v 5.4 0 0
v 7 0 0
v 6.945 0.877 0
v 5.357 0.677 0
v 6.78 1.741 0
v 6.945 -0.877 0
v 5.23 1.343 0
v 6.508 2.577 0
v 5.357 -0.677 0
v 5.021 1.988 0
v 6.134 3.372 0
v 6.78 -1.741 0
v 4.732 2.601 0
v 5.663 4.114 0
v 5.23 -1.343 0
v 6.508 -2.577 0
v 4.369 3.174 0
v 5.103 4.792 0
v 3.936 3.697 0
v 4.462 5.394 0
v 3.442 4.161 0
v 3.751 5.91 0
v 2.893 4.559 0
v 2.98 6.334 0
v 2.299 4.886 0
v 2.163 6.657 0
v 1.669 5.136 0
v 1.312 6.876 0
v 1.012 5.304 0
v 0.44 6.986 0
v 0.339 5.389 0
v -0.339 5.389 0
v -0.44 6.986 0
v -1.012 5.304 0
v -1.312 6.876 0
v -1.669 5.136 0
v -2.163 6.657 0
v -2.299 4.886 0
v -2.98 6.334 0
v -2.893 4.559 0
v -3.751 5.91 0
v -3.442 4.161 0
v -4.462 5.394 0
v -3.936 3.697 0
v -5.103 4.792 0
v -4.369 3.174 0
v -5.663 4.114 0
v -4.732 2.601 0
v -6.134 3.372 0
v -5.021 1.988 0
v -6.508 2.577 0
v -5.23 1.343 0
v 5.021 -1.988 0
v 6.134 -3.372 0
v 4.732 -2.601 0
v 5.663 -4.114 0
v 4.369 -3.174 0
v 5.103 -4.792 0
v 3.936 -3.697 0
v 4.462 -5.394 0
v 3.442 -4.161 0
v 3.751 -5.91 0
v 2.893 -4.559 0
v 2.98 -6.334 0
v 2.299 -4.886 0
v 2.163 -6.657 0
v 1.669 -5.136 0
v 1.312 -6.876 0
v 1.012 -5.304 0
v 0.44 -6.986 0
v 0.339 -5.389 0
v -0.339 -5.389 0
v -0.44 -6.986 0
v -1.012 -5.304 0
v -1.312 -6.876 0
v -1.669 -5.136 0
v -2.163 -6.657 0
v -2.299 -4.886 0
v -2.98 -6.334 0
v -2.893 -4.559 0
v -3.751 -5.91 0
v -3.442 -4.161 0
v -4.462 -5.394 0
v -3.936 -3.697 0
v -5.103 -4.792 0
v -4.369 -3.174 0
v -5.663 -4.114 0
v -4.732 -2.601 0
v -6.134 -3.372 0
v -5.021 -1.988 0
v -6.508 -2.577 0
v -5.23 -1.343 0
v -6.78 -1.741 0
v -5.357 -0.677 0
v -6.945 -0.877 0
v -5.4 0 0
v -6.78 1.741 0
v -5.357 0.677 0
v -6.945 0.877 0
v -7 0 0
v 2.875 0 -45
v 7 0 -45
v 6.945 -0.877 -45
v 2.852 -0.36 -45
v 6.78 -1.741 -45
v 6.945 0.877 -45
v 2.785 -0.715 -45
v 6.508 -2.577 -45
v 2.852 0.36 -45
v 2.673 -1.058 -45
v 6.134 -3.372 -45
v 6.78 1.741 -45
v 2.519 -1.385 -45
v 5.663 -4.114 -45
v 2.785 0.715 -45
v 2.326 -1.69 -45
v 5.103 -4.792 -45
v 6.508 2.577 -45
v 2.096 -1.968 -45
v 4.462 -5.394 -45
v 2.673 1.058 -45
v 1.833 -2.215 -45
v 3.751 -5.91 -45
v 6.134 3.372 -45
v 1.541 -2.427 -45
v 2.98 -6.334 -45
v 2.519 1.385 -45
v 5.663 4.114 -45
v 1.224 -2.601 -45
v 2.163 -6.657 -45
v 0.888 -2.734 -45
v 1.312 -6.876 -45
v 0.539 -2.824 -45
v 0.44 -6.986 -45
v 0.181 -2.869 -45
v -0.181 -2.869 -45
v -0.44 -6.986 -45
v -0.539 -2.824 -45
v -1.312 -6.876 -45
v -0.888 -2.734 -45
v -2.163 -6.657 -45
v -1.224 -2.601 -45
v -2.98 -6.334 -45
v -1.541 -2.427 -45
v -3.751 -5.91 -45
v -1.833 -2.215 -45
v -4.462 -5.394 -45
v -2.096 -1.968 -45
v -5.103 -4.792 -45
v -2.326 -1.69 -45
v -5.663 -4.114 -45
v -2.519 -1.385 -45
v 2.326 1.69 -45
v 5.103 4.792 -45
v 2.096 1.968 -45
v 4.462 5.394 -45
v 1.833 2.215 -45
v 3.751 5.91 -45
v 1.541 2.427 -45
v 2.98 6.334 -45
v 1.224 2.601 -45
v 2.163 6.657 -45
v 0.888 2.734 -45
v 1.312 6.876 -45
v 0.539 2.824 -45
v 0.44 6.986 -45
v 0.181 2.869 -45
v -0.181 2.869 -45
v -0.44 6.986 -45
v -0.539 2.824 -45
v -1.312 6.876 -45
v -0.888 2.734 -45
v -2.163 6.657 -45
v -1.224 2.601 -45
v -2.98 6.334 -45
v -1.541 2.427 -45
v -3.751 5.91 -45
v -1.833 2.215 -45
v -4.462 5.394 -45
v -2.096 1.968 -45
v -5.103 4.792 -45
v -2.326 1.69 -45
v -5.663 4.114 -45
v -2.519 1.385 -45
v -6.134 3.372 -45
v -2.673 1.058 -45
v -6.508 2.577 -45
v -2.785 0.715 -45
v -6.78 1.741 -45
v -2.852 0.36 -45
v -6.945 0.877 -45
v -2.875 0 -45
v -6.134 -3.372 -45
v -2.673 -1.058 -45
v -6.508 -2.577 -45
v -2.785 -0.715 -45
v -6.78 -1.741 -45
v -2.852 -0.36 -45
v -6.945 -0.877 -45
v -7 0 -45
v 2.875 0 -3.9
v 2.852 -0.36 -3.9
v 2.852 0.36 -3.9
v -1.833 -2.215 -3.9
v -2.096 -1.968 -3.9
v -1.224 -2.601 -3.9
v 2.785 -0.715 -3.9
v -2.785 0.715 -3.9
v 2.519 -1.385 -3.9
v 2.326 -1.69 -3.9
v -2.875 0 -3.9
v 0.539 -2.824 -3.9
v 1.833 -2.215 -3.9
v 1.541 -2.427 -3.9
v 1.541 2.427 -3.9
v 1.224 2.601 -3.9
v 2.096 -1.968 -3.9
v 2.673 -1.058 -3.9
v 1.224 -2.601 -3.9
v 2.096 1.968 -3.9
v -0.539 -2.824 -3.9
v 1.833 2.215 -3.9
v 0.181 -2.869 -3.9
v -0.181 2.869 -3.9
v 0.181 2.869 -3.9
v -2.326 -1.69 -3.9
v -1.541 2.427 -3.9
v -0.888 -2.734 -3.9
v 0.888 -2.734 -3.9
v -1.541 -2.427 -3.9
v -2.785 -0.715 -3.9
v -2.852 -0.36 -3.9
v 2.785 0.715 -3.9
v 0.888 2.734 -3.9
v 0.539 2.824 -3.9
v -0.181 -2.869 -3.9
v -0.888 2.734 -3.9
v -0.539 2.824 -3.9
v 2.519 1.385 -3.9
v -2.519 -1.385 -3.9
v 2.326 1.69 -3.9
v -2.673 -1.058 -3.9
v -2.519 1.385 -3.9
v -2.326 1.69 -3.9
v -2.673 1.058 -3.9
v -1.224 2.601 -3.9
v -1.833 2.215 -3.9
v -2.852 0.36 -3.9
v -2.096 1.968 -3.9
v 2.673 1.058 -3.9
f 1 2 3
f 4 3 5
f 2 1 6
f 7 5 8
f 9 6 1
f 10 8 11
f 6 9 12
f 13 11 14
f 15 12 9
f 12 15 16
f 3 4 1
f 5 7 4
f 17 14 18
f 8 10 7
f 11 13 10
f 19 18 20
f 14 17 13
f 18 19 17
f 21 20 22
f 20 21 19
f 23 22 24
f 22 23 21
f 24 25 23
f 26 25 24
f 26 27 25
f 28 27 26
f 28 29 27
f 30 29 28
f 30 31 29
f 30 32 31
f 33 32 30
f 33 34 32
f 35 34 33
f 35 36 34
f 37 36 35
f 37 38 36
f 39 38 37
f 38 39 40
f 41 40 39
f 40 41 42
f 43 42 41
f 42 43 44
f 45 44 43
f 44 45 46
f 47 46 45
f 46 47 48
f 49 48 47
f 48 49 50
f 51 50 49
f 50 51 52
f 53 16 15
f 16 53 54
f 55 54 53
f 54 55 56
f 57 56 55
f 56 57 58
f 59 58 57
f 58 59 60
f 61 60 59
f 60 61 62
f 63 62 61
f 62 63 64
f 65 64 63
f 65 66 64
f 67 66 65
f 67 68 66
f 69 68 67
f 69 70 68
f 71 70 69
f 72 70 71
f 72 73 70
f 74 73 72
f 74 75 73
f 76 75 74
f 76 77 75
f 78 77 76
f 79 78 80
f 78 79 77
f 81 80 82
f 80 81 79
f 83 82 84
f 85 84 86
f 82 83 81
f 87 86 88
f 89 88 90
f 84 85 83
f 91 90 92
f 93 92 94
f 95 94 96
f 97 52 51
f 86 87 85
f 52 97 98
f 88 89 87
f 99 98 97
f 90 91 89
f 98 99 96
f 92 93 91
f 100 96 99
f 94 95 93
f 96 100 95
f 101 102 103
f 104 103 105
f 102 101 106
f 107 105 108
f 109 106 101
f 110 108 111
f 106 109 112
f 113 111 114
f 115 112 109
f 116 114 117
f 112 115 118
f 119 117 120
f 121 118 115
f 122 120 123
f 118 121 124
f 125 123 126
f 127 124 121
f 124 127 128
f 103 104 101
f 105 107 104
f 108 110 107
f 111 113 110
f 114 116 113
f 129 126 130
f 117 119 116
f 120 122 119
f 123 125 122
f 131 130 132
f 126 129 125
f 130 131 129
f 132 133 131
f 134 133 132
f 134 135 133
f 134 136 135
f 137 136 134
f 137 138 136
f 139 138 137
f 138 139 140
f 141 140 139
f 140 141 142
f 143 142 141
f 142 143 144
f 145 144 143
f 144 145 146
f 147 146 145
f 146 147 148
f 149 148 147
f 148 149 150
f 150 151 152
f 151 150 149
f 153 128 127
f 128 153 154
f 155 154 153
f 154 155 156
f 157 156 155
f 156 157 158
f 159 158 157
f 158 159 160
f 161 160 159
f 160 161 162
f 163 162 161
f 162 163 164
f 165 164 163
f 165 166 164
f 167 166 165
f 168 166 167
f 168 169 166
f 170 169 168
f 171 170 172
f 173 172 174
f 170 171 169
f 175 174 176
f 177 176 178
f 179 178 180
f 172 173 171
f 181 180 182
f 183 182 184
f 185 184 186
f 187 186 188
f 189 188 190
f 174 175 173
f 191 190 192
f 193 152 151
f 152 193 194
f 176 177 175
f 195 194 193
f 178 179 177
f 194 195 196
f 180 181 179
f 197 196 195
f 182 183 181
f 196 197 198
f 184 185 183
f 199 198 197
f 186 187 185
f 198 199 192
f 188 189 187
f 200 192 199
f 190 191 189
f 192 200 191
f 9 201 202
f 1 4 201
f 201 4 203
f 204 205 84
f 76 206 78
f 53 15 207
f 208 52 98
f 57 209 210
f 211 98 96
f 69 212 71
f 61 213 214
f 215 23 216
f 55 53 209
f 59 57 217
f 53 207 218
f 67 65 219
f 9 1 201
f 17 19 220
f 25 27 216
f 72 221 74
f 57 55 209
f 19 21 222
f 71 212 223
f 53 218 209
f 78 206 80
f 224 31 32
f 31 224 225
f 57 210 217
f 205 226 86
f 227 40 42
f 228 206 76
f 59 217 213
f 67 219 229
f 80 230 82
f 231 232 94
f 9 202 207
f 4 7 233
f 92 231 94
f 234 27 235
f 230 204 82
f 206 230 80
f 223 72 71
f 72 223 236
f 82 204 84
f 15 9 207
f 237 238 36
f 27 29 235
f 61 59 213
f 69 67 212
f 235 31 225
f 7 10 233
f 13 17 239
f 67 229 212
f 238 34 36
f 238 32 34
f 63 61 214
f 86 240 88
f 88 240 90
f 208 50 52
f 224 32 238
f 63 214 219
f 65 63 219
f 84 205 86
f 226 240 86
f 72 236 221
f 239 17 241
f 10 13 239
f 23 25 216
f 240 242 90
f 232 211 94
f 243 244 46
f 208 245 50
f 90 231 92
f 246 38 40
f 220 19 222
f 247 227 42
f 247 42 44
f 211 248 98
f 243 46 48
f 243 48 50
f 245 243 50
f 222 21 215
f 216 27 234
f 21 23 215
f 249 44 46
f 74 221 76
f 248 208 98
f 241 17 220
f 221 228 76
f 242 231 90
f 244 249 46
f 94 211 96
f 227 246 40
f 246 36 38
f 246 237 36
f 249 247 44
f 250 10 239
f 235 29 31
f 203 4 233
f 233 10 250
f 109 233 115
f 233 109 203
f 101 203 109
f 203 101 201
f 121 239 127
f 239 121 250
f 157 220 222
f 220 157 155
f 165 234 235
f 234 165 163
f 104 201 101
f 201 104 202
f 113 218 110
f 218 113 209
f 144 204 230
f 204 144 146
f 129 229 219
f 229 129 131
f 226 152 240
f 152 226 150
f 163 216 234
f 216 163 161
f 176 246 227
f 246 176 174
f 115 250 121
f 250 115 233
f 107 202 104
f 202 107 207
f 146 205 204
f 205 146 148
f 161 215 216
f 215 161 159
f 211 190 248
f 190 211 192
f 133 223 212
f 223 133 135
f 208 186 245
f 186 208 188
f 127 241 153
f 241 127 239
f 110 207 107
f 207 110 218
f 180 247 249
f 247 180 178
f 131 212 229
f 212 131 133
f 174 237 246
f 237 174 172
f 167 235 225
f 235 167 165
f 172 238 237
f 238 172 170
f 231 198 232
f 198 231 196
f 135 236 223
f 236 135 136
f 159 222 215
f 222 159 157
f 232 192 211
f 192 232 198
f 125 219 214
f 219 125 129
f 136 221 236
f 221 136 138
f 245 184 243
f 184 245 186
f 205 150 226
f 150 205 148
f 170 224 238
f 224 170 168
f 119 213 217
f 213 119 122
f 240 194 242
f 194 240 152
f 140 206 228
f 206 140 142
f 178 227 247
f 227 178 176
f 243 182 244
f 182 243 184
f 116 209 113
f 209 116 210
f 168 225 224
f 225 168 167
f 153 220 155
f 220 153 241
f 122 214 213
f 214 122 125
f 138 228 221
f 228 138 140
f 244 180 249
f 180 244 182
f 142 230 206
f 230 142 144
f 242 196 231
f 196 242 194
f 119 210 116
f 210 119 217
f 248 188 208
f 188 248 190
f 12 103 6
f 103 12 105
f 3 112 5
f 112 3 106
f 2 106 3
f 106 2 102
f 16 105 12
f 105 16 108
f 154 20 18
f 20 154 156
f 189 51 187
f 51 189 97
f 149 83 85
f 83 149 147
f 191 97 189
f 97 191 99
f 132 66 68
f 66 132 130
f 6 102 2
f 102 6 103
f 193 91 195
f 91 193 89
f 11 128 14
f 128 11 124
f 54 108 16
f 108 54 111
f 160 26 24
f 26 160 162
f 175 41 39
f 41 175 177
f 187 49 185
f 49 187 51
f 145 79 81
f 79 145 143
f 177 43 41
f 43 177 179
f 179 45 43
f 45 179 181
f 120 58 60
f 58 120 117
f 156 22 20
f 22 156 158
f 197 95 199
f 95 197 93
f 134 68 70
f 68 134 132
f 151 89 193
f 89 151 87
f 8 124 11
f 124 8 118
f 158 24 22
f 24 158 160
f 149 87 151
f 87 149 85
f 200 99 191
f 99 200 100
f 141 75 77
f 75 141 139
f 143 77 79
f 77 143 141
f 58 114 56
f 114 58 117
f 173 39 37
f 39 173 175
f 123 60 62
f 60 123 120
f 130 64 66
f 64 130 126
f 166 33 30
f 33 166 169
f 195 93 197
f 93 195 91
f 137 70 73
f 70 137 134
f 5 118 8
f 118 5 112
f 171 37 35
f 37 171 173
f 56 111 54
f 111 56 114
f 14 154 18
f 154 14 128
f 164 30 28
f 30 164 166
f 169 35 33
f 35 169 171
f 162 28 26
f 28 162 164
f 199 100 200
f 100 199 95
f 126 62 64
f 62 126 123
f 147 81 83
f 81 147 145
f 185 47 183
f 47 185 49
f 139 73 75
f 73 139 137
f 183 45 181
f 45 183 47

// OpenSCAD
$fn = 50;


difference() {
	union() {
		translate(v = [0, 0, -45.0000000000]) {
			cylinder(h = 45, r = 7.0000000000);
		}
		cylinder(h = 0, r = 13.0000000000);
	}
	union() {
		translate(v = [0, 0, 0]) {
			rotate(a = [0, 0, 0]) {
				difference() {
					union() {
						#translate(v = [0, 0, -45.0000000000]) {
							cylinder(h = 45, r = 2.6000000000);
						}
						#translate(v = [0, 0, -3.9000000000]) {
							cylinder(h = 3.9000000000, r = 7.0000000000, r1 = 2.8750000000, r2 = 5.4000000000);
						}
						#translate(v = [0, 0, -45.0000000000]) {
							cylinder(h = 45, r = 2.8750000000);
						}
						#translate(v = [0, 0, -45.0000000000]) {
							cylinder(h = 45, r = 2.6000000000);
						}
					}
					union();
				}
			}
		}
	}
}
